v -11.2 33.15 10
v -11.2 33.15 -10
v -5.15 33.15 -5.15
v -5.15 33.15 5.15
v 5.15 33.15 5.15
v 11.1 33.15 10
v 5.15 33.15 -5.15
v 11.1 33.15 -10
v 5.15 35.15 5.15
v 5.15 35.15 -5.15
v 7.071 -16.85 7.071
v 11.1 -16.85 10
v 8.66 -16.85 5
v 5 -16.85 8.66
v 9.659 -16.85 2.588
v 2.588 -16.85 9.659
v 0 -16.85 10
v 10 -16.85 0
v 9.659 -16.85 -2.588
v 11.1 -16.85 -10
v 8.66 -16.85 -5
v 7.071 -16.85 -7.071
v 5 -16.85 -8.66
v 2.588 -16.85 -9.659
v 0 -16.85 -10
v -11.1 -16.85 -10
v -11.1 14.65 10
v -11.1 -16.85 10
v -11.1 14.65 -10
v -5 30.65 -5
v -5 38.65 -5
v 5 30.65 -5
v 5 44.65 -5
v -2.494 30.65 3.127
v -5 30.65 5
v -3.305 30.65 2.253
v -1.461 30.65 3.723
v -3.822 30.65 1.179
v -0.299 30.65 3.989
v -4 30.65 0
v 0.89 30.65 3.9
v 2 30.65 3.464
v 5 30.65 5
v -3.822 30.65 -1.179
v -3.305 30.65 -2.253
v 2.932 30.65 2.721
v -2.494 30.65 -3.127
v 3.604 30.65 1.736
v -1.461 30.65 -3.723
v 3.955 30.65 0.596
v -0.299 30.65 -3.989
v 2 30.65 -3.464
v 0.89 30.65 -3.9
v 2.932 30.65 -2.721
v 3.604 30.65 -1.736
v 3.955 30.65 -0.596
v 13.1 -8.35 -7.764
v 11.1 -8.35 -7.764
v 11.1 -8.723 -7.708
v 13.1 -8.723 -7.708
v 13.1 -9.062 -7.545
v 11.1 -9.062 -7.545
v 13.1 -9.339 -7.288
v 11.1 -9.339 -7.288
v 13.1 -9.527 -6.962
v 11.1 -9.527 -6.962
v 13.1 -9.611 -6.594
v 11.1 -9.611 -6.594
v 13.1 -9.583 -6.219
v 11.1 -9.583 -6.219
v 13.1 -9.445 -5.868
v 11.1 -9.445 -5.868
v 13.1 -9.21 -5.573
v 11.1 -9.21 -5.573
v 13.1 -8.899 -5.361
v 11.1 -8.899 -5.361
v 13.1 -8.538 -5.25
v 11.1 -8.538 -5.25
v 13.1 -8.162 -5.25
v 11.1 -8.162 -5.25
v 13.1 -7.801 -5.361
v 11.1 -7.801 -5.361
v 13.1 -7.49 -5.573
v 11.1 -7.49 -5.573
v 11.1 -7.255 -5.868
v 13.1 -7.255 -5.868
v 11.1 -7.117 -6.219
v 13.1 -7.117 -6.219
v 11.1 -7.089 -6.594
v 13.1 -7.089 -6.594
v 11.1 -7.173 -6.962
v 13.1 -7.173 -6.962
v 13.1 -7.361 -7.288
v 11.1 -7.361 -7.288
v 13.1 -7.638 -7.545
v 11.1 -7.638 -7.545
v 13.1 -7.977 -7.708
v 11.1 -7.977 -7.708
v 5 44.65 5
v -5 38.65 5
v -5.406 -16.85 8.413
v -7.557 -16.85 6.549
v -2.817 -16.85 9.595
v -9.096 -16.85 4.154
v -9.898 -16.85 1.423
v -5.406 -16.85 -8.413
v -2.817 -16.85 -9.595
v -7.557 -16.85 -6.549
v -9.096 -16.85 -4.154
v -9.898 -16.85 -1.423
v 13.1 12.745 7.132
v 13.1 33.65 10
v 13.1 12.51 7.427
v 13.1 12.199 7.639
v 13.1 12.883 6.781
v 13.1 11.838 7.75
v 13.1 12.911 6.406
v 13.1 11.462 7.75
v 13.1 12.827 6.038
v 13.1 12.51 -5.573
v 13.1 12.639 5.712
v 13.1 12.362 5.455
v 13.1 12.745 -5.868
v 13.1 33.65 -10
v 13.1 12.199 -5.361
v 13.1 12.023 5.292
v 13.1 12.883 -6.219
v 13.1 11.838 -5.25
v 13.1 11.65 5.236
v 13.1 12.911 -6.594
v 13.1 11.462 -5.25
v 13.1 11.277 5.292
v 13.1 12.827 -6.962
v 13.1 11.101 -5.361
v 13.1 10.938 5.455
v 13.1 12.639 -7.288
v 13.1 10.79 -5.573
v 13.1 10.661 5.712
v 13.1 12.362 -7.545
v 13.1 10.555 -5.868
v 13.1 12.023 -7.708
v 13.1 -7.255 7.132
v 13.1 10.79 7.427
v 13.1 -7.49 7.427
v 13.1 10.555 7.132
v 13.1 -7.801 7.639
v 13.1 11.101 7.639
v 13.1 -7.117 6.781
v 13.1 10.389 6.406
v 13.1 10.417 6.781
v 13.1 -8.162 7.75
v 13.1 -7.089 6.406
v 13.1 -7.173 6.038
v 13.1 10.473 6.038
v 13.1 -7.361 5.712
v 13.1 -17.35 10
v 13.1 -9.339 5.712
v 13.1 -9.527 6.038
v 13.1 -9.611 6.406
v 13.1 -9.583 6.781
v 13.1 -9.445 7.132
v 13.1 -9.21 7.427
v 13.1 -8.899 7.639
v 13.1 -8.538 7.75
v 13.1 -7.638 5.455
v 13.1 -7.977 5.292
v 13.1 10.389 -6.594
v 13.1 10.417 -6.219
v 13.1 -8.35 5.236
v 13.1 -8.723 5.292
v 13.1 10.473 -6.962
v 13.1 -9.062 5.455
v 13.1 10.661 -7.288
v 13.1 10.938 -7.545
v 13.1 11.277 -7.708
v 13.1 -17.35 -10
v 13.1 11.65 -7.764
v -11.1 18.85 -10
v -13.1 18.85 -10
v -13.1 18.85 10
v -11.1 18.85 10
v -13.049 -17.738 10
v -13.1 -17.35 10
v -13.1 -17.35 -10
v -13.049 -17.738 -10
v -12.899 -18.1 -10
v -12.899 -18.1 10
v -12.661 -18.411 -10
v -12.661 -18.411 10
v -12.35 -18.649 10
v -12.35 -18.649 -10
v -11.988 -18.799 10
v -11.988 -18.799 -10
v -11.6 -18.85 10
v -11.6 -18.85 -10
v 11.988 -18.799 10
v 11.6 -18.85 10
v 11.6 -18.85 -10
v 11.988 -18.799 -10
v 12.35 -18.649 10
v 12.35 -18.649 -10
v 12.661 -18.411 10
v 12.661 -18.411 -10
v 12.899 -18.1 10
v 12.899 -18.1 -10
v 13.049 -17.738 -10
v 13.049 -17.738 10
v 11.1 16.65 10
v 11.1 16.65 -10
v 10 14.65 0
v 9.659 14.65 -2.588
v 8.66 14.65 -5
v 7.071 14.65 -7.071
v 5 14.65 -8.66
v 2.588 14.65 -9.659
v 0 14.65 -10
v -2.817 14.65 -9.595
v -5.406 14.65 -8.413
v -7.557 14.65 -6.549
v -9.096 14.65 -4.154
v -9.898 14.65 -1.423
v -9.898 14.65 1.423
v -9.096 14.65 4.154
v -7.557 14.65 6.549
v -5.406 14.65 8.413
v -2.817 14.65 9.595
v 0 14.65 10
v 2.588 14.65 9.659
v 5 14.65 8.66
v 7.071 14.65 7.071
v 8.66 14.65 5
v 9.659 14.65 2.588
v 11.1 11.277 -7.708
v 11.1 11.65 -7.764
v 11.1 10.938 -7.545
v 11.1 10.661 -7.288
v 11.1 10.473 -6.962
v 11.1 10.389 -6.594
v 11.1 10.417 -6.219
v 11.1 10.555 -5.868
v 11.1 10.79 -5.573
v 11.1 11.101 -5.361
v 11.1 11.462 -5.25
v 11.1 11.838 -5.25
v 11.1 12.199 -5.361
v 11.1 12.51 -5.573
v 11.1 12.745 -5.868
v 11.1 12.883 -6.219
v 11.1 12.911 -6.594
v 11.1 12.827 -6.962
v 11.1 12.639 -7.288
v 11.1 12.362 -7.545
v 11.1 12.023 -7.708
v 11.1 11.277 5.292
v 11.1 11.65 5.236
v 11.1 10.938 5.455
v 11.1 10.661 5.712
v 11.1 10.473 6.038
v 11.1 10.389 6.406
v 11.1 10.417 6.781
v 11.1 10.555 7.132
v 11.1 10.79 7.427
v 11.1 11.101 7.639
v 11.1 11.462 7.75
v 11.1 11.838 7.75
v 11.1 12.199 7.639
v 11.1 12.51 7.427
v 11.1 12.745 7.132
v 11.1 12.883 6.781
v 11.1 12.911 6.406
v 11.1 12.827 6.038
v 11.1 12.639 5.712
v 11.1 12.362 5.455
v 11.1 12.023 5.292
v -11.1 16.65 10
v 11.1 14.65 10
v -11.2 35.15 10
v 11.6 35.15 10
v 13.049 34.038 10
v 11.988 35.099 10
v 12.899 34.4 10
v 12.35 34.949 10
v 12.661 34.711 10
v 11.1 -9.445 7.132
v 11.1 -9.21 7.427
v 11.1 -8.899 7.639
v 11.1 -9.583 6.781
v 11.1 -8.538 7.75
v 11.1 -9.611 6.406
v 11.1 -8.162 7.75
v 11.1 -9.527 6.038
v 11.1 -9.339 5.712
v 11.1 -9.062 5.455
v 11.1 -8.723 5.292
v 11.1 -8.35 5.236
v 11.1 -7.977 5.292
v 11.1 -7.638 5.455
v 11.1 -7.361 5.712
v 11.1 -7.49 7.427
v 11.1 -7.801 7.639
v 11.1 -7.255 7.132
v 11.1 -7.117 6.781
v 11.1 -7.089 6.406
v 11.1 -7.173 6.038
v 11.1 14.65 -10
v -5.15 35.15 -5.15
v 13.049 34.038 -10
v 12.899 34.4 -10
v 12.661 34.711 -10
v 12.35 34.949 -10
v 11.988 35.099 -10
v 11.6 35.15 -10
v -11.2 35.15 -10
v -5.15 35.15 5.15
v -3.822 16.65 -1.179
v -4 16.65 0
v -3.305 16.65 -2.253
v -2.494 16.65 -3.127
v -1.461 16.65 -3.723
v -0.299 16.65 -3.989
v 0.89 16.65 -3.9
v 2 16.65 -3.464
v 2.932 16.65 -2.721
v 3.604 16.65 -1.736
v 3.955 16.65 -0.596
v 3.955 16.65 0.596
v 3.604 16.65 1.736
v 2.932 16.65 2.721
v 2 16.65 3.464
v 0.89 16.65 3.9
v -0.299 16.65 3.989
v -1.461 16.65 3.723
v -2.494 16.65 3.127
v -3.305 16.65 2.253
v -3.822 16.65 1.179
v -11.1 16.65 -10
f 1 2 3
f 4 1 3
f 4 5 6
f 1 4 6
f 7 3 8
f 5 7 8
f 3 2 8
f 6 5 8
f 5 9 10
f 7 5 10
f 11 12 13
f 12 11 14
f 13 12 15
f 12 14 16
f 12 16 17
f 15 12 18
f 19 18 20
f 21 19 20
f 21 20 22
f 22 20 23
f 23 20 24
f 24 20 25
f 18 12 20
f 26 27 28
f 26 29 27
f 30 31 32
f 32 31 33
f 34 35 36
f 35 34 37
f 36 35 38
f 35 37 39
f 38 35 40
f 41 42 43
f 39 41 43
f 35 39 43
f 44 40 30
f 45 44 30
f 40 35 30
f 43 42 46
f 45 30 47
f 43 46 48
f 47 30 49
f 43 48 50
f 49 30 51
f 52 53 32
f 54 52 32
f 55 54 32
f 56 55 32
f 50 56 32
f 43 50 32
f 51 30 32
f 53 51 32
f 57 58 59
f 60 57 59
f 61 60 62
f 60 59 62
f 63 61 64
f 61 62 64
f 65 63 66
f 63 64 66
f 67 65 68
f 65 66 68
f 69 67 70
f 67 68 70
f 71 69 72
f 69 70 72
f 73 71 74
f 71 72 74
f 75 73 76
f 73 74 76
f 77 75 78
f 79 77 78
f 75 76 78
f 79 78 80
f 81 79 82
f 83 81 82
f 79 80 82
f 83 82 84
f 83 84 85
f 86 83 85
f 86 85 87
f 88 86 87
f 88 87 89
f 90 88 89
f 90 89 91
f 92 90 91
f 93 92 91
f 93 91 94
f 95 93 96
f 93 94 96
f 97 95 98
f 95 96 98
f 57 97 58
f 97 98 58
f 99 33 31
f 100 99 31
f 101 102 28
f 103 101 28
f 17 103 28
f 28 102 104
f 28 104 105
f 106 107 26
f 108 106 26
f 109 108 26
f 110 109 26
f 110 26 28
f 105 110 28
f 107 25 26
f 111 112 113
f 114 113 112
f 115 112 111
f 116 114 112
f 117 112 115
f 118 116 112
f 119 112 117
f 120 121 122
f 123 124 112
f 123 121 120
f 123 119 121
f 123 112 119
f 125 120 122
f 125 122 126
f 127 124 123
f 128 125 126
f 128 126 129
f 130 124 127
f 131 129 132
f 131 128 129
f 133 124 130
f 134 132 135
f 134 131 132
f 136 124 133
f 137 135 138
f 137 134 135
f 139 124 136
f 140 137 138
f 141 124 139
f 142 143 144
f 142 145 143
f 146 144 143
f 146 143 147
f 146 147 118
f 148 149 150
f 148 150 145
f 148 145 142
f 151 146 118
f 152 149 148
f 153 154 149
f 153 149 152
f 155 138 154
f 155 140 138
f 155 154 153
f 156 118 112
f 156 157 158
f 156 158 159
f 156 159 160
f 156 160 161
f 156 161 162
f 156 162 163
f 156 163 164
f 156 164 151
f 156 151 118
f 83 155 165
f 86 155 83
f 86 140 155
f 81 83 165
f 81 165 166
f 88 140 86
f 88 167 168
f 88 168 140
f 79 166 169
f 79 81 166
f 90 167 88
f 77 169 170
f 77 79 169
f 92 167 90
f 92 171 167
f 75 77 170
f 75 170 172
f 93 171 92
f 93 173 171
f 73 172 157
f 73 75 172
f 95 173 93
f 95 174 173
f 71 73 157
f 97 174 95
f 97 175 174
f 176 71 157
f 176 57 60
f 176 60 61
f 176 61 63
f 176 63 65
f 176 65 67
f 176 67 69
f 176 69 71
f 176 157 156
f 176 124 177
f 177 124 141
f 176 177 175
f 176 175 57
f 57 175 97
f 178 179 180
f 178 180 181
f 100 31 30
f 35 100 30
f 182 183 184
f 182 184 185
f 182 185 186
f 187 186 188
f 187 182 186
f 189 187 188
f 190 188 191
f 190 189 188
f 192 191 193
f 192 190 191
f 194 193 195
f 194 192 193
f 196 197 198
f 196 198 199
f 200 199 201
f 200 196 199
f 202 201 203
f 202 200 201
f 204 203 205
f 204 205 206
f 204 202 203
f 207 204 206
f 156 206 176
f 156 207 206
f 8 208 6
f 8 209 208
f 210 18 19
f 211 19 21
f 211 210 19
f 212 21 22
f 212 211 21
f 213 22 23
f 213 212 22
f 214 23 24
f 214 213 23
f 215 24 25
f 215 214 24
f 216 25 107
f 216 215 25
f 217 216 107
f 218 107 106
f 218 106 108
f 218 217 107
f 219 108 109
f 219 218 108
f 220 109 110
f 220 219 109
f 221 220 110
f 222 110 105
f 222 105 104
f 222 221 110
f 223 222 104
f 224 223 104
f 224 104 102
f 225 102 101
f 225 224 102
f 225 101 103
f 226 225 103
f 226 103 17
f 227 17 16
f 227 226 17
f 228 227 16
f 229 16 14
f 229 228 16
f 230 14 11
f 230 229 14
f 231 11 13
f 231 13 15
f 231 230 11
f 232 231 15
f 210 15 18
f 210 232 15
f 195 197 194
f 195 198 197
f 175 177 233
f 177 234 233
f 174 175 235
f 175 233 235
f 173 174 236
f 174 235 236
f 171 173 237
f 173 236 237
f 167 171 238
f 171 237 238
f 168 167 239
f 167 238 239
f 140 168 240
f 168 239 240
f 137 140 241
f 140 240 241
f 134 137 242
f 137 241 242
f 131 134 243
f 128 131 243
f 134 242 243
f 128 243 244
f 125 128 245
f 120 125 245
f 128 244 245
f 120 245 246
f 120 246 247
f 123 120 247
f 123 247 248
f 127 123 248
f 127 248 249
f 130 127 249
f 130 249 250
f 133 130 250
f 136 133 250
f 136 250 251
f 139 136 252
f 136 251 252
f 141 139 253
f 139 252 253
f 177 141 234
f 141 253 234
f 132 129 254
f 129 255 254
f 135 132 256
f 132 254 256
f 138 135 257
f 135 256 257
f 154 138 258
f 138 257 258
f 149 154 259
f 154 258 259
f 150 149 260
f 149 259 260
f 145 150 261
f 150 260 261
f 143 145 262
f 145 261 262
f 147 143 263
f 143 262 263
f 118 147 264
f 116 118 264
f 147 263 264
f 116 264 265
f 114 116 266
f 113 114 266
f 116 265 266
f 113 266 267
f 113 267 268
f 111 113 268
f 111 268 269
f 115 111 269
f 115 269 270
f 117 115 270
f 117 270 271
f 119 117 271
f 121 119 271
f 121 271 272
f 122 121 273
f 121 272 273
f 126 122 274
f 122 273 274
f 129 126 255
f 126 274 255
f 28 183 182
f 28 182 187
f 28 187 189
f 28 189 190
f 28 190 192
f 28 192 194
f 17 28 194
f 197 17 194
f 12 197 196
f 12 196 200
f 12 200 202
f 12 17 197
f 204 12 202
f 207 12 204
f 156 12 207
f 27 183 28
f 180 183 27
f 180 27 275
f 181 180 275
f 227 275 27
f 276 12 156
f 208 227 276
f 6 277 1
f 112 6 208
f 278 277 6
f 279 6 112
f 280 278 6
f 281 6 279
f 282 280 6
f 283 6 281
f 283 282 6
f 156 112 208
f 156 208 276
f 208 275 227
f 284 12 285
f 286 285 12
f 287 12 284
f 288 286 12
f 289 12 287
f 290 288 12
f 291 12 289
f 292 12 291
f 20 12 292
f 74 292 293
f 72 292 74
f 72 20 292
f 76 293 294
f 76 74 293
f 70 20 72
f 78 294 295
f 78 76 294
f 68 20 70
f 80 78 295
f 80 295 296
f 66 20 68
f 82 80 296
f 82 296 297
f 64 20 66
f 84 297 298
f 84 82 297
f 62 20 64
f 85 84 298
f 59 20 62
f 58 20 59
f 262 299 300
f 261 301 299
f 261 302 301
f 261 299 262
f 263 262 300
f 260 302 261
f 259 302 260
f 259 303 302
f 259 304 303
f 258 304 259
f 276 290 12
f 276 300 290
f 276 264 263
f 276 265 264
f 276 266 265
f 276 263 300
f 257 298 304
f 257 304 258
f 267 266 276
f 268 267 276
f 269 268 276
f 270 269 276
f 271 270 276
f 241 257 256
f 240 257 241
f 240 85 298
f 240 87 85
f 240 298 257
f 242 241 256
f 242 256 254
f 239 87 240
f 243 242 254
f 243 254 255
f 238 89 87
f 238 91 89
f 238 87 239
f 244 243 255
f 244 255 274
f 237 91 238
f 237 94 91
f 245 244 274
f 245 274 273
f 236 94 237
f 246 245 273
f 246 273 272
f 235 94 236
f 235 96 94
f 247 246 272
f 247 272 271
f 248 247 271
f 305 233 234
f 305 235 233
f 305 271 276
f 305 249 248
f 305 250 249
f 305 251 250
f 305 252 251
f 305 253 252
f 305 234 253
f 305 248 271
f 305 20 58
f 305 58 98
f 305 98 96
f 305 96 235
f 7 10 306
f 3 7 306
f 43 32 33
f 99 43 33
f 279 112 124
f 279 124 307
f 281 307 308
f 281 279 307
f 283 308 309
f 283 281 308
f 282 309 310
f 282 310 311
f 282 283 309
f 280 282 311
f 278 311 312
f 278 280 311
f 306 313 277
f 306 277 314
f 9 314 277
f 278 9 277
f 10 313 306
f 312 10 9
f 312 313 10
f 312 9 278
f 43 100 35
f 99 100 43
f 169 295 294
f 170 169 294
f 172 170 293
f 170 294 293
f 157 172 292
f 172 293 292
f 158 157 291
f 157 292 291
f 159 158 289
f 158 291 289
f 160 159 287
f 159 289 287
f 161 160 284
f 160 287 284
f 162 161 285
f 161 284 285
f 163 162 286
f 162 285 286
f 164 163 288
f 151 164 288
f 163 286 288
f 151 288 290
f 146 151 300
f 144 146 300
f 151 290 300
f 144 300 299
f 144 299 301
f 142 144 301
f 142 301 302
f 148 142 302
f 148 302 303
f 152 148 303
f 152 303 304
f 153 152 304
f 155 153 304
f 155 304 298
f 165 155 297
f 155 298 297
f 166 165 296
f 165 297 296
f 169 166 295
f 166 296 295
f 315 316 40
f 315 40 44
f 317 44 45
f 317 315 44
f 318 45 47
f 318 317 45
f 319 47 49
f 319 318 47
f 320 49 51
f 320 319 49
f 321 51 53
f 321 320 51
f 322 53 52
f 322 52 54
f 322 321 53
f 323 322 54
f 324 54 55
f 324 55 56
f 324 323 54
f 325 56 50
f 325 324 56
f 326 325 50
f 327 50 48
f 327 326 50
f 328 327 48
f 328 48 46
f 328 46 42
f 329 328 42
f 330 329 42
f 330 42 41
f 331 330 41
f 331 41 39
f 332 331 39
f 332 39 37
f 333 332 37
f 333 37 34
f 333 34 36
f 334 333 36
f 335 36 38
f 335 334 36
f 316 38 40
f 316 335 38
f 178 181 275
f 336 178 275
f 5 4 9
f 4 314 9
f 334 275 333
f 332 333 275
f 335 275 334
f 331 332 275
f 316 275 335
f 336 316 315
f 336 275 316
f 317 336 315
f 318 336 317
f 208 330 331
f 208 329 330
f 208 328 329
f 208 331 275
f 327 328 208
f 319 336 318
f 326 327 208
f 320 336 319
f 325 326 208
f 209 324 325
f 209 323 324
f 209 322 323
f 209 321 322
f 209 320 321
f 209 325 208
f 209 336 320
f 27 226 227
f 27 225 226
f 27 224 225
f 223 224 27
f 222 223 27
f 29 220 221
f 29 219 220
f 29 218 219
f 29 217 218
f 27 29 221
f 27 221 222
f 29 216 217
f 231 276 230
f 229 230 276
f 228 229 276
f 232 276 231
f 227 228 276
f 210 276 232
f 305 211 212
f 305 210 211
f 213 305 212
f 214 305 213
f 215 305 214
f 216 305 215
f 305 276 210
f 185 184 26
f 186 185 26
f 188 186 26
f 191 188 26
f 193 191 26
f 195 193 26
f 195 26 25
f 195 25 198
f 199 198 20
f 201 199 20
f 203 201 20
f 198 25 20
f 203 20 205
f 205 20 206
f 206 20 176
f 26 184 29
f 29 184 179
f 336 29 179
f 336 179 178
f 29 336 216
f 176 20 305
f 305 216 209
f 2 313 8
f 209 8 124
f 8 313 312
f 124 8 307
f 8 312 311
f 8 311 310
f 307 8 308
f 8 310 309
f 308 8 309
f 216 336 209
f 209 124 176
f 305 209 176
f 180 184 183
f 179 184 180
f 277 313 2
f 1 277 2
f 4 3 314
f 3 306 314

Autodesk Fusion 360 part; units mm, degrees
sketch "Sketch1" plane through (0, 0, 0) normal (0, 0, 1) x (1, 0, 0)
  line L0 (-13.1, 18.85) -> (-11.1, 18.85)
  line L1 (-11.1, 18.85) -> (-11.1, -18.85)
  line L2 (-11.1, -18.85) -> (-13.1, -18.85)
  line L3 (-13.1, -18.85) -> (-13.1, 18.85)
  line L4 (-13.1, -18.85) -> (13.1, -18.85)
  line L5 (13.1, -18.85) -> (13.1, -16.85)
  line L6 (13.1, -16.85) -> (-13.1, -16.85)
  line L7 (-13.1, -16.85) -> (-13.1, -18.85)
  line L8 (13.1, -18.85) -> (11.1, -18.85)
  line L9 (11.1, -18.85) -> (11.1, 35.15)
  line L10 (11.1, 35.15) -> (13.1, 35.15)
  line L11 (13.1, 35.15) -> (13.1, -18.85)
  line L12 (13.1, 35.15) -> (-11.2, 35.15)
  line L13 (-11.2, 35.15) -> (-11.2, 33.15)
  line L14 (-11.2, 33.15) -> (13.1, 33.15)
  line L15 (13.1, 33.15) -> (13.1, 35.15)
  line L16 (-11.1, 16.65) -> (11.1, 16.65)
  line L17 (11.1, 16.65) -> (11.1, 14.65)
  line L18 (11.1, 14.65) -> (-11.1, 14.65)
  line L19 (-11.1, 14.65) -> (-11.1, 16.65)
  dimension "d1" = 2
  dimension "d2" = 2
  dimension "d3" = 2
  dimension "d4" = 2
  dimension "d5" = 2
  dimension "d6" = 26.2
  dimension "d7" = 37.7
  dimension "d8" = 35.5
  dimension "d9" = 54
  dimension "d10" = 24.3
  dimension "d36" = 13.1
  dimension "d37" = 18.85
extrude "Extrude1" add sketch "Sketch1" along normal mid plane 20 contours L0 L1 L3 L6 L19 | L1 L2 L3 L4 L6 L7 | L1 L9 L16 L17 L18 L19 | L1 L4 L6 L9 | L6 L9 L11 L14 L17 | L4 L5 L6 L8 L9 L11 | L9 L12 L13 L14 | L9 L10 L11 L12 L14 L15
sketch "Sketch2" plane through (0, 14.65, 0) normal (0, -1, 0) x (1, 0, 0)
  line L0 (-11.1, -10) -> (11.1, -10)
  line L1 (11.1, -10) -> (11.1, 10)
  line L2 (11.1, 10) -> (-11.1, 10)
  line L3 (-11.1, 10) -> (-11.1, -10)
  circle A0 centre (0, 0) radius 10
  dimension "d13" = 20
  dimension "d14" = 10
  dimension "d15" = 22.2
  dimension "d16" = 11.1
extrude "Extrude2" add sketch "Sketch2" along normal blind 32 contours A0
fillet "Fillet1" radius 1.5 3 edges at (-13.1, -18.85, 0) (13.1, -18.85, 0) (13.1, 35.15, 0)
sketch "Sketch3" plane through (0, 16.65, 0) normal (0, 1, 0) x (-1, 0, 0)
  line L0 (-11.1, -10) -> (11.1, -10)
  line L1 (11.1, -10) -> (11.1, 10)
  line L2 (11.1, 10) -> (-11.1, 10)
  line L3 (-11.1, 10) -> (-11.1, -10)
  line L4 (-11.6, -10) -> (-13.1, -10)
  line L5 (-11.6, -10) -> (11.6, -10)
  line L6 (13.1, -10) -> (11.6, -10)
  line L7 (-13.1, -10) -> (-13.1, 10)
  line L8 (-13.1, 10) -> (-11.6, 10)
  line L9 (11.6, 10) -> (13.1, 10)
  line L10 (13.1, 10) -> (13.1, -10)
  line L11 (11.6, 10) -> (-11.6, 10)
  circle A0 centre (0, 0) radius 4
  arc A1 (0, -10) -> (0, 10) centre (0, 0) ccw
  arc A2 (0, 10) -> (0, -10) centre (0, 0) ccw
  arc A3 (0, -10) -> (0, 10) centre (0, 0) ccw
  arc A4 (0, 10) -> (0, -10) centre (0, 0) ccw
  dimension "d20" = 8
extrude "Extrude3" add sketch "Sketch3" along normal blind 15 contours A0
sketch "Sketch5" plane through (0, 35.15, 0) normal (0, 1, 0) x (-1, 0, 0)
  line L0 (-11.6, 10) -> (-11.6, -10)
  line L1 (-11.6, -10) -> (11.2, -10)
  line L2 (11.2, -10) -> (11.2, 10)
  line L3 (11.2, 10) -> (-11.6, 10)
  circle A0 centre (0, 0) radius 4
  circle A1 centre (0, 0) radius 4
  line L4 (5.15, 5.15) -> (-5.15, 5.15)
  line L5 (-5.15, 5.15) -> (-5.15, -5.15)
  line L6 (-5.15, -5.15) -> (5.15, -5.15)
  line L7 (5.15, -5.15) -> (5.15, 5.15)
  line L8 (5.15, 5.15) -> (-5.15, -5.15) construction
  line L9 (-5.15, 5.15) -> (5.15, -5.15) construction
  dimension "d30" = 10.3
  dimension "d31" = 10.3
extrude "Extrude5" cut sketch "Sketch5" against normal blind 4 contours A0 A1 | L4 L5 L6 L7
sketch "Sketch4" plane through (0, 0, 0) normal (0, 0, 1) x (1, 0, 0)
  line L0 (-5, 30.65) -> (5, 30.65)
  line L1 (5, 30.65) -> (5, 44.65)
  line L2 (5, 44.65) -> (-5, 44.65)
  line L3 (-5, 44.65) -> (-5, 30.65)
  line L4 (5, 44.65) -> (-5, 38.65)
  line L5 (-11.1, 16.65) -> (11.1, 16.65)
  dimension "d23" = 10
  dimension "d26" = 14
  dimension "d27" = 8
  dimension "d35" = 28
  dimension "d38" = 5
extrude "Extrude4" add sketch "Sketch4" along normal mid plane 10 contours L0 L1 L3 L4
sketch "Sketch6" plane through (13.1, 0, 0) normal (1, 0, 0) x (0, 1, 0)
  line L0 (33.65, -10) -> (33.65, 10)
  line L1 (33.65, 10) -> (-17.35, 10)
  line L2 (-17.35, 10) -> (-17.35, -10)
  line L3 (-17.35, -10) -> (33.65, -10)
  line L4 (35.15, -10) -> (35.15, 10)
  point P0 (-8.35, 6.5)
  point P1 (11.65, 6.5)
  point P2 (11.65, -6.5)
  point P3 (-8.35, -6.5)
  dimension "d39" = 13
  dimension "d40" = 6.5
  dimension "d41" = 20
  dimension "d42" = 23.5
  dimension "d46" = 13
hole "Hole1" at (13.1, 11.65, 6.5) at (13.1, 11.65, -6.5) at (13.1, -8.35, -6.5) at (13.1, -8.35, 6.5) direction (-1, 0, 0) diameter 2.529 depth 2 tip angle 180
thread "Thread1" "ISO Metric profile 3.0 M3x0.5 6H" major diameter 3.086 minor diameter 2.529 pitch 0.5 angle 60 resizes the face on face at (11.7667, 11.7759, 5.2418) on face at (11.7667, 11.7759, -7.7582) on face at (11.7667, -8.2241, -7.7582) on face at (11.7667, -8.2241, 5.2418)
equation "d2 = d1"
equation "d3 = d1"
equation "d4 = d1"
equation "d5 = d1"
equation "d36 = d6 / 2"
equation "d37 = d7 / 2"
equation "d38 = d23 / 2"
equation "d40 = d39 / 2"
equation "d46 = d39"
